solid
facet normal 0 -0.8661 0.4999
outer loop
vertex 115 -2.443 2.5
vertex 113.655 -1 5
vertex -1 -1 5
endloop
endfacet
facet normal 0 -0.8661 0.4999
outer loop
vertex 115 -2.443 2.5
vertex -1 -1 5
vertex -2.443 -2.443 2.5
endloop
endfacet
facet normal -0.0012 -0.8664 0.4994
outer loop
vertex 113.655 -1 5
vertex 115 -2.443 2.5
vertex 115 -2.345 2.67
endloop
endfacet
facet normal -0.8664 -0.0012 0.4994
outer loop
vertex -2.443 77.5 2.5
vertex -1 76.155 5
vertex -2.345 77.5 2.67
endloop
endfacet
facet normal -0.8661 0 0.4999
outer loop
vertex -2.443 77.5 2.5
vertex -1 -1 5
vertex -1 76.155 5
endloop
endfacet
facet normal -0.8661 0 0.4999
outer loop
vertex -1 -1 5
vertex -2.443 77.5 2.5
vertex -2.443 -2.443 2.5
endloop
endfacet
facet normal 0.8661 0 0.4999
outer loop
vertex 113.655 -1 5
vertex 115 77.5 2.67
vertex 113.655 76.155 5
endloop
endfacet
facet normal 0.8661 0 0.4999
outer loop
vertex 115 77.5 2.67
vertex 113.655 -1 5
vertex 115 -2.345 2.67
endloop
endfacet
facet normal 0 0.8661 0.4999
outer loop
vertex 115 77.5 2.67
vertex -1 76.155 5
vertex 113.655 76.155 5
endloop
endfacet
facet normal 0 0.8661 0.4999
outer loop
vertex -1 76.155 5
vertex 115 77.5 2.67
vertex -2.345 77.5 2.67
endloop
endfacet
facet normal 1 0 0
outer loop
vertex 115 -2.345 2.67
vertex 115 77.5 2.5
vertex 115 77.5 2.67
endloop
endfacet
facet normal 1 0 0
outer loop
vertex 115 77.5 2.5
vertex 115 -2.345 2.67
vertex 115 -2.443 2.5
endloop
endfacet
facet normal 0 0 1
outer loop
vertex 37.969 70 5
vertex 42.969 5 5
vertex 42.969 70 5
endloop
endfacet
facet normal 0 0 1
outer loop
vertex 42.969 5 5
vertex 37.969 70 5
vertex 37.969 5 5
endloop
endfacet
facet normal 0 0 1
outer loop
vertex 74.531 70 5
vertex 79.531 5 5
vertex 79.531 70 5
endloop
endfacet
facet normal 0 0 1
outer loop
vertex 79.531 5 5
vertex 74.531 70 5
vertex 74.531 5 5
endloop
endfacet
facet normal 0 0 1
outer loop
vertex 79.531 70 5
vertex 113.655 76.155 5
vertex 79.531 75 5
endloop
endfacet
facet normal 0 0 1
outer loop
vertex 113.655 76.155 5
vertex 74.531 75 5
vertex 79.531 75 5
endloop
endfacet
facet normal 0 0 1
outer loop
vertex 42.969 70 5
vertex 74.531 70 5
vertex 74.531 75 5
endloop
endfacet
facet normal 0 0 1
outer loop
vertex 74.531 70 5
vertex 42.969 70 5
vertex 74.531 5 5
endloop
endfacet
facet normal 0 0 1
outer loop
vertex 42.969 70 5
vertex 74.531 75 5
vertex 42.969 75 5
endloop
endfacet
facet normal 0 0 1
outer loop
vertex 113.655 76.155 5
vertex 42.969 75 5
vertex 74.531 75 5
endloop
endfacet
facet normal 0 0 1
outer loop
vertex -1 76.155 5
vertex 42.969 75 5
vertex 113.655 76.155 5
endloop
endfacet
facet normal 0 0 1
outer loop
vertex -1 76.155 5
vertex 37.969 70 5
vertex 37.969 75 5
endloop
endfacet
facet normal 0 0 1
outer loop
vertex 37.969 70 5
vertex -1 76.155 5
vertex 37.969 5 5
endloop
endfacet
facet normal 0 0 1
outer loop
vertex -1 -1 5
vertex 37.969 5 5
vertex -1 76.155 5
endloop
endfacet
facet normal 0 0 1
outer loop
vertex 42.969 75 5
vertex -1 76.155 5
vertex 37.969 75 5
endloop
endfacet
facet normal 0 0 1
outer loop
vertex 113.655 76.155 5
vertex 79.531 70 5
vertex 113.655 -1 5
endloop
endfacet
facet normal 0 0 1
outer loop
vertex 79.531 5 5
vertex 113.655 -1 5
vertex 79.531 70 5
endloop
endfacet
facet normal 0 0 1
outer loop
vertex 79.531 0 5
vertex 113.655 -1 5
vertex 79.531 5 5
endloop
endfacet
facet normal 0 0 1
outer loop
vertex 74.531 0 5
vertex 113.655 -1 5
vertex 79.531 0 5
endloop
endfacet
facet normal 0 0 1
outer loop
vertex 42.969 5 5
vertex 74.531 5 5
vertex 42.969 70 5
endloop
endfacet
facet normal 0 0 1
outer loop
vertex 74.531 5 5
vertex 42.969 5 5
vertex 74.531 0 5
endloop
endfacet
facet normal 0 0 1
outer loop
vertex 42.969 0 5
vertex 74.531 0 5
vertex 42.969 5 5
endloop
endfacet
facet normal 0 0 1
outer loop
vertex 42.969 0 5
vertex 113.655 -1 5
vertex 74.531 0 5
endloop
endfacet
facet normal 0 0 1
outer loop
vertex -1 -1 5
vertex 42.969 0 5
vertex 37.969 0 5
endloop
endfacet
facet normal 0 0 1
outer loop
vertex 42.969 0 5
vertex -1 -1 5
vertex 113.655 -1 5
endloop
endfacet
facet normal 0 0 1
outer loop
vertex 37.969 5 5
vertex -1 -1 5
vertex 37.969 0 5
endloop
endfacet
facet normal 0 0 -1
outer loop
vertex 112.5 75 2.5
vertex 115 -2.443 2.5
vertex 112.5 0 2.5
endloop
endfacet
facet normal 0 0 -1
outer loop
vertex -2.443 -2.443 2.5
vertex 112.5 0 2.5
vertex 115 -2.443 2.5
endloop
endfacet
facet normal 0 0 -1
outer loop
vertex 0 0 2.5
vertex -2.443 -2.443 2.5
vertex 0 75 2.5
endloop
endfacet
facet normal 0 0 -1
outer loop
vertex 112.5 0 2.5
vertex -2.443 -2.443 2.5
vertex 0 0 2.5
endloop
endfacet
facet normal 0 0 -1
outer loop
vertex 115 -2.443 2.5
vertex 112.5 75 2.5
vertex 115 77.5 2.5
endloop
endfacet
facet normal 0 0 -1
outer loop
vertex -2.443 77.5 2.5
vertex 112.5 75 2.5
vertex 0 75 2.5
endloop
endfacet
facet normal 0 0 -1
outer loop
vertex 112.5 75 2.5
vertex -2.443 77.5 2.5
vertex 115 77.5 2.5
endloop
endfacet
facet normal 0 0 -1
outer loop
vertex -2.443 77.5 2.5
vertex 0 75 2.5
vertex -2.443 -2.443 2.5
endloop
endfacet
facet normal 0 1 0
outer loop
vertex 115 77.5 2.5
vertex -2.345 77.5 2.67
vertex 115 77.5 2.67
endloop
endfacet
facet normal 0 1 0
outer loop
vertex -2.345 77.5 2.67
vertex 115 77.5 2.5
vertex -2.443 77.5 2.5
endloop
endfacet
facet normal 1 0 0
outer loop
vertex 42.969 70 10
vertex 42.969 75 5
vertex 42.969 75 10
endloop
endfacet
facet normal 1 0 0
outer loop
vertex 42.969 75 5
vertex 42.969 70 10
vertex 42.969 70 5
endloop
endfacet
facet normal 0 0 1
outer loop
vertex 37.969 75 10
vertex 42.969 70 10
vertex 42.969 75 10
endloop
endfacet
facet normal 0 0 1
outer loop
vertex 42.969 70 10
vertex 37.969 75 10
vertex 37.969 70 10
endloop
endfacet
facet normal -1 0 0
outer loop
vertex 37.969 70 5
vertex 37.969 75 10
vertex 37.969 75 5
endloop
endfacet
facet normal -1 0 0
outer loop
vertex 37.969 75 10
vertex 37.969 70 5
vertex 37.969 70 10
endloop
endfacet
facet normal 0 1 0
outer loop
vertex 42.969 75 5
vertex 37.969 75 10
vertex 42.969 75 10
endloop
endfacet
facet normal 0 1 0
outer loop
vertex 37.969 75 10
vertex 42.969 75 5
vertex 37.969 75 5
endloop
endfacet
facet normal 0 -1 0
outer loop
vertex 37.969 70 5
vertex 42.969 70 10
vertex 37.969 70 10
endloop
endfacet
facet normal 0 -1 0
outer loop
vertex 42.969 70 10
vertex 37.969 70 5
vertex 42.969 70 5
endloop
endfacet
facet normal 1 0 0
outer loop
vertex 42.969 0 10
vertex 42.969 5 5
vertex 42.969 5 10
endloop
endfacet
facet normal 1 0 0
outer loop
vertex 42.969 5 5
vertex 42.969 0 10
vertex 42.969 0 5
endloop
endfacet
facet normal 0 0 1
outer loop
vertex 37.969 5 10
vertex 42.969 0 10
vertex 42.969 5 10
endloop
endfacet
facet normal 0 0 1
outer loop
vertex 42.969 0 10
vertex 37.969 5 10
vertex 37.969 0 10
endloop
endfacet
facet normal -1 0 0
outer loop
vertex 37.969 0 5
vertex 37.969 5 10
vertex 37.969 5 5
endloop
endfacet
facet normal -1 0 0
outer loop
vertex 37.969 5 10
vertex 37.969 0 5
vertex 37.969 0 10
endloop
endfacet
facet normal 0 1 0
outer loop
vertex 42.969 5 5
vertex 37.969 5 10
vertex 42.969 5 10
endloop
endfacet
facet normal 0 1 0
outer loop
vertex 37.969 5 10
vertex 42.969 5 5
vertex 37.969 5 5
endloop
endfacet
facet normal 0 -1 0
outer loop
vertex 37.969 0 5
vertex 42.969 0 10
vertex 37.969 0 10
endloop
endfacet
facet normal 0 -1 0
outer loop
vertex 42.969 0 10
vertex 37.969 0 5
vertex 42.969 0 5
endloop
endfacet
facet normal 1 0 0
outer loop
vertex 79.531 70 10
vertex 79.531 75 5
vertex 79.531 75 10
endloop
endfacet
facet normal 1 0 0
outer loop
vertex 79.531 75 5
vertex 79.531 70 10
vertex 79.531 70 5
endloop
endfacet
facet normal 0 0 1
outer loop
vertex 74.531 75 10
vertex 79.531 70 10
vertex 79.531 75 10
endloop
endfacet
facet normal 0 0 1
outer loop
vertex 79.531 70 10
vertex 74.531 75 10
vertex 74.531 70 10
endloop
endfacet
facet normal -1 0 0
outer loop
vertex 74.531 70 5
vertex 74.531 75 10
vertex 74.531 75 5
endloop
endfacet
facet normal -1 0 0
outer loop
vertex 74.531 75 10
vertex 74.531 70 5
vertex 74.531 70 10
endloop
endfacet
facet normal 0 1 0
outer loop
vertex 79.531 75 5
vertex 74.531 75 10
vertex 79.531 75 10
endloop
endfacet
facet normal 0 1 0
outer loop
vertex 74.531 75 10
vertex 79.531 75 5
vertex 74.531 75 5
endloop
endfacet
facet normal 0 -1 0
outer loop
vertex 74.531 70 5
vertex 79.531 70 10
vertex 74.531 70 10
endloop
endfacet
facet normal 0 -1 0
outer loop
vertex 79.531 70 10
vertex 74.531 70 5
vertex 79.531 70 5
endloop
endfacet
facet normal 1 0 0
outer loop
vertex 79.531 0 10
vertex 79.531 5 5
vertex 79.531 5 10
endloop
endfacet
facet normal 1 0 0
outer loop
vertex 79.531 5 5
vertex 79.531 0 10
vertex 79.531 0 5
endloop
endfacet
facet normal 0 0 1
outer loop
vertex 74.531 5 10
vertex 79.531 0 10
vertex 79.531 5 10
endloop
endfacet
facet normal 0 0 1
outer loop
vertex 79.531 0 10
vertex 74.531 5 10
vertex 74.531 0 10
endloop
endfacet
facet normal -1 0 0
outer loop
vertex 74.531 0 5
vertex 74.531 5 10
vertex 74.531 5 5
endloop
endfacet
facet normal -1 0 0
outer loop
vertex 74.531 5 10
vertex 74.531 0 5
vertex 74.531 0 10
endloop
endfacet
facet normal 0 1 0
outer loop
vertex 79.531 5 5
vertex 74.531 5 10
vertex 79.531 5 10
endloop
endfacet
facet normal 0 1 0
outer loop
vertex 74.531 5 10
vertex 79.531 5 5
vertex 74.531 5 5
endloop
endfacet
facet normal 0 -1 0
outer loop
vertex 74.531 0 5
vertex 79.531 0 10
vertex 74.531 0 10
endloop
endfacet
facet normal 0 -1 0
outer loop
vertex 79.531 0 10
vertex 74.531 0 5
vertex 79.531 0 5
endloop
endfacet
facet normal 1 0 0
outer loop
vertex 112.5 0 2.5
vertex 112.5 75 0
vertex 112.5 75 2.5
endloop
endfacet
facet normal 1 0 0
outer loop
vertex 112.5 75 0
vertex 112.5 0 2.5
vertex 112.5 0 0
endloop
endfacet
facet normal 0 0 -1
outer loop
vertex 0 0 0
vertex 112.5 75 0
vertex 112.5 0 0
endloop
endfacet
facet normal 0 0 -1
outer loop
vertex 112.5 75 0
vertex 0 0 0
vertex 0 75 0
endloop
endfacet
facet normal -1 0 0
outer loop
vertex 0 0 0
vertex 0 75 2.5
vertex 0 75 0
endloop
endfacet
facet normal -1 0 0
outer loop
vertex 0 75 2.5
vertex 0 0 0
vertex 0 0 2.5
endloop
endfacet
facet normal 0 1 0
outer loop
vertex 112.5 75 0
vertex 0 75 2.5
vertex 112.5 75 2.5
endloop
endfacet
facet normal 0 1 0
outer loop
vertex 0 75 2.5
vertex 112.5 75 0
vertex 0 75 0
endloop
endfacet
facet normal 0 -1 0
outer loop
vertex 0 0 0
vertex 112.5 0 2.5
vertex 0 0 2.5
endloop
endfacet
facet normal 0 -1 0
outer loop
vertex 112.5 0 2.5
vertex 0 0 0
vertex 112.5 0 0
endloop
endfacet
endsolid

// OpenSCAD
module d4() {
    import("/Users/audrey/Downloads/Braille_Polyhedral_Dice_-_March_2018_version_2836494/files/d4.STL", center = true);
}

module d6() {
    import("/Users/audrey/Downloads/Braille_Polyhedral_Dice_-_March_2018_version_2836494/files/d6C.STL", center = true);
}

module d8() {
    d8width = 32.77;
    d8height = 23.53;

    translate([-d8height * 0.5, d8width * -0.5, d8height * -0.5]) import("/Users/audrey/Downloads/Braille_Polyhedral_Dice_-_March_2018_version_2836494/files/d8.STL", center = true);
}

module d10() {
    d10x = 27.99;
    d10y = 29.15;
    d10z = 28.1;
    translate([d10x * -0.5, d10y * -0.5, d10z * -0.5]) import("/Users/audrey/Downloads/Braille_Polyhedral_Dice_-_March_2018_version_2836494/files/d10.STL", center = true);
}

module d12() {
    import("/Users/audrey/Downloads/Braille_Polyhedral_Dice_-_March_2018_version_2836494/files/d12.STL", center = true);
}

module d20() {
    import("/Users/audrey/Downloads/Braille_Polyhedral_Dice_-_March_2018_version_2836494/files/d20_corrected.STL", center = true);
}

module centeredCube(x=10, y=10, z=10) {
    translate([x * -0.5, y * -0.5, z * -0.5]) cube([x, y, z]);
}


//rotate([9, 4.5, 0]) translate([-40, -40, 10]) d20();

module braille_dice() {
    rotate([10.5, 0.3, 0]) translate([4, 4, 5]) d20();

    translate([63, 0, 25]) rotate([-90, 0, 45]) d4();

    d6_width = 22.99;

    translate([9, 44, 12]) d6();

    translate([56, 57, 21]) rotate([35, 0, 0]) d8();

    d12w = 40;
    d12l = 40;
    d12h = 40;

    translate([77, 32, 11]) rotate([90, 0, 0]) d12();

    translate([90, 57, 21]) rotate([42.5, 0, 0]) rotate([0, 20, 0]) d10();
}

//d10x = 27.99;
//d10y = 29.15;
//d10z = 28.1;
//translate([d10x * -0.5, d10y * -0.5, d10z * -0.5]) d10();
//centeredCube(x=d10x, y=d10y, z=d10z) cube([d10x, d10y, d10z]);


//braille_dice();

//d8width = 32.77;
//d8height = 23.53;
//
//translate([-d8height * 0.5, d8width * -0.5, d8height * -0.5]) d8();
//translate([-d8height * 0.5, d8width * -0.5, d8height * -0.5]) cube([d8height, d8width, d8height]);

//translate([d6_width * -0.5, d6_width * -0.5, d6_width * -0.5]) d6();
//cube(d6_width * 0.5);
//rotate([90, 180, 0]) cube(d6_width * 0.5);

function inch_to_mm(inches) = inches / 2 * 2.5 * 10;

//l = 6 / 2 * 2.5 * 10;
//w = 4 / 2 * 2.5 * 10;
//h = 2.5 / 2 * 2.5 * 10;

l = inch_to_mm(9);
w = inch_to_mm(6);
h = inch_to_mm(5.5);

echo(l);
echo(w);

thickness = 5; // 8mm = .8cm



echo(h);

module disc() {
    minkowski() {
        cylinder(h = thickness, r = w / 6);
        sphere(3);
    }
}
echo(w / 3);

module base_top_basic() {
    translate([thickness * -0.5, thickness * -0.5, 0.5 * thickness]) cube([l + thickness, w + thickness, 0.5 * thickness]);
}

module base_top() {
    difference() {
    base_top_basic();
    union() {
        translate([0, -1, 0]) rotate([60, 0, 0]) scale([1.1, 1, 1]) base_top_basic();
        translate([-1, 0, 0]) rotate([0, -60, 0]) scale([1, 1.1, 1]) base_top_basic();
        translate([l, 0, 2]) rotate([0, 60, 0]) scale([1, 1.1, 1]) base_top_basic();
        translate([0, w, 2]) rotate([-60, 0, 0]) scale([1.1, 1, 1]) base_top_basic();
    }
    }
}

module base() {
    union() {
        cube([l, w, thickness]);
        base_top();
        proportions = [0.175, 0.5, 0.825];
        w_proportion = 0.25;
//        for (i=proportions){
//            portion = i; // * 0.25;
//            translate([l * portion, w * w_proportion, 3]) disc();
//            translate([l * portion, w * (1 - w_proportion), 3]) disc();
//        }
        for (i=[0, 1]) {
            x_coord = proportions[i] + 0.5 * (proportions[i + 1] - proportions[i]);
            translate([l * x_coord, w - thickness, thickness]) cube(thickness);
            translate([l * x_coord, 0, thickness]) cube(thickness);
        }
    }
}

base();

module side() {
    difference() {
        union() {
            translate([-thickness, -thickness, 0]) cube([l + 2 * thickness, thickness, h]);
            translate([-thickness, -thickness, 0]) cube([thickness, w * 0.5 + thickness, h]);
            translate([l, -thickness, 0]) cube([thickness, w * 0.5 + thickness, h]);
            translate([-2 * thickness, w * 0.5 - thickness * 0.5, 0]) cube([thickness * 2, thickness * 0.5, h]);
            translate([l, w * 0.5 - thickness * 0.5, 0]) cube([thickness * 2, thickness * 0.5, h]);
        }
        base_top();
    }
}
module hemisphere(r=2.5, fidelity=100) {
    difference() {
       sphere(r=r, $fn=fidelity);
       translate([-r, -r, -2 * r]) cube([r * 2, r * 2, r * 2]);
    }
}

//hemisphere_size = 4;
//translate([0, 0, 0 * thickness]) {
//    
//    proportions = [0.175, 0.5, 0.825];
//    w_proportion = 0.25;
////        for (i=proportions){
////            portion = i; // * 0.25;
////            translate([l * portion, w * w_proportion, 3]) disc();
////            translate([l * portion, w * (1 - w_proportion), 3]) disc();
////        }
//    for (i=[0, 1]) {
//        x_coord = proportions[i] + 0.5 * (proportions[i + 1] - proportions[i]);
//        translate([l * x_coord, w - hemisphere_size, thickness]) hemisphere(r=hemisphere_size);
//        translate([l * x_coord + (i * 2 - 1) * 2 * hemisphere_size, hemisphere_size, thickness]) hemisphere(r=hemisphere_size);
//    }
////    hemisphere();
//}
//
//translate([0, 0, thickness * 1]) {
//    translate([l * 0.5, w * 0.5, 0]) hemisphere(5);
//    translate([5, w - 5 - 5, 0]) hemisphere(5);
//    translate([l - 5, 5, 0]) hemisphere(5);
//    translate([6, 6 + 6, 0]) hemisphere(6);
//    translate([l - 6, w - 6, 0]) hemisphere(6);
//}
//cube([l, w, thickness * 0.5]);

//side();
//translate([l, w, 0]) rotate([0, 0, 180]) side();

//translate([l * 0.25, w * 0.33, 0]) disc();
